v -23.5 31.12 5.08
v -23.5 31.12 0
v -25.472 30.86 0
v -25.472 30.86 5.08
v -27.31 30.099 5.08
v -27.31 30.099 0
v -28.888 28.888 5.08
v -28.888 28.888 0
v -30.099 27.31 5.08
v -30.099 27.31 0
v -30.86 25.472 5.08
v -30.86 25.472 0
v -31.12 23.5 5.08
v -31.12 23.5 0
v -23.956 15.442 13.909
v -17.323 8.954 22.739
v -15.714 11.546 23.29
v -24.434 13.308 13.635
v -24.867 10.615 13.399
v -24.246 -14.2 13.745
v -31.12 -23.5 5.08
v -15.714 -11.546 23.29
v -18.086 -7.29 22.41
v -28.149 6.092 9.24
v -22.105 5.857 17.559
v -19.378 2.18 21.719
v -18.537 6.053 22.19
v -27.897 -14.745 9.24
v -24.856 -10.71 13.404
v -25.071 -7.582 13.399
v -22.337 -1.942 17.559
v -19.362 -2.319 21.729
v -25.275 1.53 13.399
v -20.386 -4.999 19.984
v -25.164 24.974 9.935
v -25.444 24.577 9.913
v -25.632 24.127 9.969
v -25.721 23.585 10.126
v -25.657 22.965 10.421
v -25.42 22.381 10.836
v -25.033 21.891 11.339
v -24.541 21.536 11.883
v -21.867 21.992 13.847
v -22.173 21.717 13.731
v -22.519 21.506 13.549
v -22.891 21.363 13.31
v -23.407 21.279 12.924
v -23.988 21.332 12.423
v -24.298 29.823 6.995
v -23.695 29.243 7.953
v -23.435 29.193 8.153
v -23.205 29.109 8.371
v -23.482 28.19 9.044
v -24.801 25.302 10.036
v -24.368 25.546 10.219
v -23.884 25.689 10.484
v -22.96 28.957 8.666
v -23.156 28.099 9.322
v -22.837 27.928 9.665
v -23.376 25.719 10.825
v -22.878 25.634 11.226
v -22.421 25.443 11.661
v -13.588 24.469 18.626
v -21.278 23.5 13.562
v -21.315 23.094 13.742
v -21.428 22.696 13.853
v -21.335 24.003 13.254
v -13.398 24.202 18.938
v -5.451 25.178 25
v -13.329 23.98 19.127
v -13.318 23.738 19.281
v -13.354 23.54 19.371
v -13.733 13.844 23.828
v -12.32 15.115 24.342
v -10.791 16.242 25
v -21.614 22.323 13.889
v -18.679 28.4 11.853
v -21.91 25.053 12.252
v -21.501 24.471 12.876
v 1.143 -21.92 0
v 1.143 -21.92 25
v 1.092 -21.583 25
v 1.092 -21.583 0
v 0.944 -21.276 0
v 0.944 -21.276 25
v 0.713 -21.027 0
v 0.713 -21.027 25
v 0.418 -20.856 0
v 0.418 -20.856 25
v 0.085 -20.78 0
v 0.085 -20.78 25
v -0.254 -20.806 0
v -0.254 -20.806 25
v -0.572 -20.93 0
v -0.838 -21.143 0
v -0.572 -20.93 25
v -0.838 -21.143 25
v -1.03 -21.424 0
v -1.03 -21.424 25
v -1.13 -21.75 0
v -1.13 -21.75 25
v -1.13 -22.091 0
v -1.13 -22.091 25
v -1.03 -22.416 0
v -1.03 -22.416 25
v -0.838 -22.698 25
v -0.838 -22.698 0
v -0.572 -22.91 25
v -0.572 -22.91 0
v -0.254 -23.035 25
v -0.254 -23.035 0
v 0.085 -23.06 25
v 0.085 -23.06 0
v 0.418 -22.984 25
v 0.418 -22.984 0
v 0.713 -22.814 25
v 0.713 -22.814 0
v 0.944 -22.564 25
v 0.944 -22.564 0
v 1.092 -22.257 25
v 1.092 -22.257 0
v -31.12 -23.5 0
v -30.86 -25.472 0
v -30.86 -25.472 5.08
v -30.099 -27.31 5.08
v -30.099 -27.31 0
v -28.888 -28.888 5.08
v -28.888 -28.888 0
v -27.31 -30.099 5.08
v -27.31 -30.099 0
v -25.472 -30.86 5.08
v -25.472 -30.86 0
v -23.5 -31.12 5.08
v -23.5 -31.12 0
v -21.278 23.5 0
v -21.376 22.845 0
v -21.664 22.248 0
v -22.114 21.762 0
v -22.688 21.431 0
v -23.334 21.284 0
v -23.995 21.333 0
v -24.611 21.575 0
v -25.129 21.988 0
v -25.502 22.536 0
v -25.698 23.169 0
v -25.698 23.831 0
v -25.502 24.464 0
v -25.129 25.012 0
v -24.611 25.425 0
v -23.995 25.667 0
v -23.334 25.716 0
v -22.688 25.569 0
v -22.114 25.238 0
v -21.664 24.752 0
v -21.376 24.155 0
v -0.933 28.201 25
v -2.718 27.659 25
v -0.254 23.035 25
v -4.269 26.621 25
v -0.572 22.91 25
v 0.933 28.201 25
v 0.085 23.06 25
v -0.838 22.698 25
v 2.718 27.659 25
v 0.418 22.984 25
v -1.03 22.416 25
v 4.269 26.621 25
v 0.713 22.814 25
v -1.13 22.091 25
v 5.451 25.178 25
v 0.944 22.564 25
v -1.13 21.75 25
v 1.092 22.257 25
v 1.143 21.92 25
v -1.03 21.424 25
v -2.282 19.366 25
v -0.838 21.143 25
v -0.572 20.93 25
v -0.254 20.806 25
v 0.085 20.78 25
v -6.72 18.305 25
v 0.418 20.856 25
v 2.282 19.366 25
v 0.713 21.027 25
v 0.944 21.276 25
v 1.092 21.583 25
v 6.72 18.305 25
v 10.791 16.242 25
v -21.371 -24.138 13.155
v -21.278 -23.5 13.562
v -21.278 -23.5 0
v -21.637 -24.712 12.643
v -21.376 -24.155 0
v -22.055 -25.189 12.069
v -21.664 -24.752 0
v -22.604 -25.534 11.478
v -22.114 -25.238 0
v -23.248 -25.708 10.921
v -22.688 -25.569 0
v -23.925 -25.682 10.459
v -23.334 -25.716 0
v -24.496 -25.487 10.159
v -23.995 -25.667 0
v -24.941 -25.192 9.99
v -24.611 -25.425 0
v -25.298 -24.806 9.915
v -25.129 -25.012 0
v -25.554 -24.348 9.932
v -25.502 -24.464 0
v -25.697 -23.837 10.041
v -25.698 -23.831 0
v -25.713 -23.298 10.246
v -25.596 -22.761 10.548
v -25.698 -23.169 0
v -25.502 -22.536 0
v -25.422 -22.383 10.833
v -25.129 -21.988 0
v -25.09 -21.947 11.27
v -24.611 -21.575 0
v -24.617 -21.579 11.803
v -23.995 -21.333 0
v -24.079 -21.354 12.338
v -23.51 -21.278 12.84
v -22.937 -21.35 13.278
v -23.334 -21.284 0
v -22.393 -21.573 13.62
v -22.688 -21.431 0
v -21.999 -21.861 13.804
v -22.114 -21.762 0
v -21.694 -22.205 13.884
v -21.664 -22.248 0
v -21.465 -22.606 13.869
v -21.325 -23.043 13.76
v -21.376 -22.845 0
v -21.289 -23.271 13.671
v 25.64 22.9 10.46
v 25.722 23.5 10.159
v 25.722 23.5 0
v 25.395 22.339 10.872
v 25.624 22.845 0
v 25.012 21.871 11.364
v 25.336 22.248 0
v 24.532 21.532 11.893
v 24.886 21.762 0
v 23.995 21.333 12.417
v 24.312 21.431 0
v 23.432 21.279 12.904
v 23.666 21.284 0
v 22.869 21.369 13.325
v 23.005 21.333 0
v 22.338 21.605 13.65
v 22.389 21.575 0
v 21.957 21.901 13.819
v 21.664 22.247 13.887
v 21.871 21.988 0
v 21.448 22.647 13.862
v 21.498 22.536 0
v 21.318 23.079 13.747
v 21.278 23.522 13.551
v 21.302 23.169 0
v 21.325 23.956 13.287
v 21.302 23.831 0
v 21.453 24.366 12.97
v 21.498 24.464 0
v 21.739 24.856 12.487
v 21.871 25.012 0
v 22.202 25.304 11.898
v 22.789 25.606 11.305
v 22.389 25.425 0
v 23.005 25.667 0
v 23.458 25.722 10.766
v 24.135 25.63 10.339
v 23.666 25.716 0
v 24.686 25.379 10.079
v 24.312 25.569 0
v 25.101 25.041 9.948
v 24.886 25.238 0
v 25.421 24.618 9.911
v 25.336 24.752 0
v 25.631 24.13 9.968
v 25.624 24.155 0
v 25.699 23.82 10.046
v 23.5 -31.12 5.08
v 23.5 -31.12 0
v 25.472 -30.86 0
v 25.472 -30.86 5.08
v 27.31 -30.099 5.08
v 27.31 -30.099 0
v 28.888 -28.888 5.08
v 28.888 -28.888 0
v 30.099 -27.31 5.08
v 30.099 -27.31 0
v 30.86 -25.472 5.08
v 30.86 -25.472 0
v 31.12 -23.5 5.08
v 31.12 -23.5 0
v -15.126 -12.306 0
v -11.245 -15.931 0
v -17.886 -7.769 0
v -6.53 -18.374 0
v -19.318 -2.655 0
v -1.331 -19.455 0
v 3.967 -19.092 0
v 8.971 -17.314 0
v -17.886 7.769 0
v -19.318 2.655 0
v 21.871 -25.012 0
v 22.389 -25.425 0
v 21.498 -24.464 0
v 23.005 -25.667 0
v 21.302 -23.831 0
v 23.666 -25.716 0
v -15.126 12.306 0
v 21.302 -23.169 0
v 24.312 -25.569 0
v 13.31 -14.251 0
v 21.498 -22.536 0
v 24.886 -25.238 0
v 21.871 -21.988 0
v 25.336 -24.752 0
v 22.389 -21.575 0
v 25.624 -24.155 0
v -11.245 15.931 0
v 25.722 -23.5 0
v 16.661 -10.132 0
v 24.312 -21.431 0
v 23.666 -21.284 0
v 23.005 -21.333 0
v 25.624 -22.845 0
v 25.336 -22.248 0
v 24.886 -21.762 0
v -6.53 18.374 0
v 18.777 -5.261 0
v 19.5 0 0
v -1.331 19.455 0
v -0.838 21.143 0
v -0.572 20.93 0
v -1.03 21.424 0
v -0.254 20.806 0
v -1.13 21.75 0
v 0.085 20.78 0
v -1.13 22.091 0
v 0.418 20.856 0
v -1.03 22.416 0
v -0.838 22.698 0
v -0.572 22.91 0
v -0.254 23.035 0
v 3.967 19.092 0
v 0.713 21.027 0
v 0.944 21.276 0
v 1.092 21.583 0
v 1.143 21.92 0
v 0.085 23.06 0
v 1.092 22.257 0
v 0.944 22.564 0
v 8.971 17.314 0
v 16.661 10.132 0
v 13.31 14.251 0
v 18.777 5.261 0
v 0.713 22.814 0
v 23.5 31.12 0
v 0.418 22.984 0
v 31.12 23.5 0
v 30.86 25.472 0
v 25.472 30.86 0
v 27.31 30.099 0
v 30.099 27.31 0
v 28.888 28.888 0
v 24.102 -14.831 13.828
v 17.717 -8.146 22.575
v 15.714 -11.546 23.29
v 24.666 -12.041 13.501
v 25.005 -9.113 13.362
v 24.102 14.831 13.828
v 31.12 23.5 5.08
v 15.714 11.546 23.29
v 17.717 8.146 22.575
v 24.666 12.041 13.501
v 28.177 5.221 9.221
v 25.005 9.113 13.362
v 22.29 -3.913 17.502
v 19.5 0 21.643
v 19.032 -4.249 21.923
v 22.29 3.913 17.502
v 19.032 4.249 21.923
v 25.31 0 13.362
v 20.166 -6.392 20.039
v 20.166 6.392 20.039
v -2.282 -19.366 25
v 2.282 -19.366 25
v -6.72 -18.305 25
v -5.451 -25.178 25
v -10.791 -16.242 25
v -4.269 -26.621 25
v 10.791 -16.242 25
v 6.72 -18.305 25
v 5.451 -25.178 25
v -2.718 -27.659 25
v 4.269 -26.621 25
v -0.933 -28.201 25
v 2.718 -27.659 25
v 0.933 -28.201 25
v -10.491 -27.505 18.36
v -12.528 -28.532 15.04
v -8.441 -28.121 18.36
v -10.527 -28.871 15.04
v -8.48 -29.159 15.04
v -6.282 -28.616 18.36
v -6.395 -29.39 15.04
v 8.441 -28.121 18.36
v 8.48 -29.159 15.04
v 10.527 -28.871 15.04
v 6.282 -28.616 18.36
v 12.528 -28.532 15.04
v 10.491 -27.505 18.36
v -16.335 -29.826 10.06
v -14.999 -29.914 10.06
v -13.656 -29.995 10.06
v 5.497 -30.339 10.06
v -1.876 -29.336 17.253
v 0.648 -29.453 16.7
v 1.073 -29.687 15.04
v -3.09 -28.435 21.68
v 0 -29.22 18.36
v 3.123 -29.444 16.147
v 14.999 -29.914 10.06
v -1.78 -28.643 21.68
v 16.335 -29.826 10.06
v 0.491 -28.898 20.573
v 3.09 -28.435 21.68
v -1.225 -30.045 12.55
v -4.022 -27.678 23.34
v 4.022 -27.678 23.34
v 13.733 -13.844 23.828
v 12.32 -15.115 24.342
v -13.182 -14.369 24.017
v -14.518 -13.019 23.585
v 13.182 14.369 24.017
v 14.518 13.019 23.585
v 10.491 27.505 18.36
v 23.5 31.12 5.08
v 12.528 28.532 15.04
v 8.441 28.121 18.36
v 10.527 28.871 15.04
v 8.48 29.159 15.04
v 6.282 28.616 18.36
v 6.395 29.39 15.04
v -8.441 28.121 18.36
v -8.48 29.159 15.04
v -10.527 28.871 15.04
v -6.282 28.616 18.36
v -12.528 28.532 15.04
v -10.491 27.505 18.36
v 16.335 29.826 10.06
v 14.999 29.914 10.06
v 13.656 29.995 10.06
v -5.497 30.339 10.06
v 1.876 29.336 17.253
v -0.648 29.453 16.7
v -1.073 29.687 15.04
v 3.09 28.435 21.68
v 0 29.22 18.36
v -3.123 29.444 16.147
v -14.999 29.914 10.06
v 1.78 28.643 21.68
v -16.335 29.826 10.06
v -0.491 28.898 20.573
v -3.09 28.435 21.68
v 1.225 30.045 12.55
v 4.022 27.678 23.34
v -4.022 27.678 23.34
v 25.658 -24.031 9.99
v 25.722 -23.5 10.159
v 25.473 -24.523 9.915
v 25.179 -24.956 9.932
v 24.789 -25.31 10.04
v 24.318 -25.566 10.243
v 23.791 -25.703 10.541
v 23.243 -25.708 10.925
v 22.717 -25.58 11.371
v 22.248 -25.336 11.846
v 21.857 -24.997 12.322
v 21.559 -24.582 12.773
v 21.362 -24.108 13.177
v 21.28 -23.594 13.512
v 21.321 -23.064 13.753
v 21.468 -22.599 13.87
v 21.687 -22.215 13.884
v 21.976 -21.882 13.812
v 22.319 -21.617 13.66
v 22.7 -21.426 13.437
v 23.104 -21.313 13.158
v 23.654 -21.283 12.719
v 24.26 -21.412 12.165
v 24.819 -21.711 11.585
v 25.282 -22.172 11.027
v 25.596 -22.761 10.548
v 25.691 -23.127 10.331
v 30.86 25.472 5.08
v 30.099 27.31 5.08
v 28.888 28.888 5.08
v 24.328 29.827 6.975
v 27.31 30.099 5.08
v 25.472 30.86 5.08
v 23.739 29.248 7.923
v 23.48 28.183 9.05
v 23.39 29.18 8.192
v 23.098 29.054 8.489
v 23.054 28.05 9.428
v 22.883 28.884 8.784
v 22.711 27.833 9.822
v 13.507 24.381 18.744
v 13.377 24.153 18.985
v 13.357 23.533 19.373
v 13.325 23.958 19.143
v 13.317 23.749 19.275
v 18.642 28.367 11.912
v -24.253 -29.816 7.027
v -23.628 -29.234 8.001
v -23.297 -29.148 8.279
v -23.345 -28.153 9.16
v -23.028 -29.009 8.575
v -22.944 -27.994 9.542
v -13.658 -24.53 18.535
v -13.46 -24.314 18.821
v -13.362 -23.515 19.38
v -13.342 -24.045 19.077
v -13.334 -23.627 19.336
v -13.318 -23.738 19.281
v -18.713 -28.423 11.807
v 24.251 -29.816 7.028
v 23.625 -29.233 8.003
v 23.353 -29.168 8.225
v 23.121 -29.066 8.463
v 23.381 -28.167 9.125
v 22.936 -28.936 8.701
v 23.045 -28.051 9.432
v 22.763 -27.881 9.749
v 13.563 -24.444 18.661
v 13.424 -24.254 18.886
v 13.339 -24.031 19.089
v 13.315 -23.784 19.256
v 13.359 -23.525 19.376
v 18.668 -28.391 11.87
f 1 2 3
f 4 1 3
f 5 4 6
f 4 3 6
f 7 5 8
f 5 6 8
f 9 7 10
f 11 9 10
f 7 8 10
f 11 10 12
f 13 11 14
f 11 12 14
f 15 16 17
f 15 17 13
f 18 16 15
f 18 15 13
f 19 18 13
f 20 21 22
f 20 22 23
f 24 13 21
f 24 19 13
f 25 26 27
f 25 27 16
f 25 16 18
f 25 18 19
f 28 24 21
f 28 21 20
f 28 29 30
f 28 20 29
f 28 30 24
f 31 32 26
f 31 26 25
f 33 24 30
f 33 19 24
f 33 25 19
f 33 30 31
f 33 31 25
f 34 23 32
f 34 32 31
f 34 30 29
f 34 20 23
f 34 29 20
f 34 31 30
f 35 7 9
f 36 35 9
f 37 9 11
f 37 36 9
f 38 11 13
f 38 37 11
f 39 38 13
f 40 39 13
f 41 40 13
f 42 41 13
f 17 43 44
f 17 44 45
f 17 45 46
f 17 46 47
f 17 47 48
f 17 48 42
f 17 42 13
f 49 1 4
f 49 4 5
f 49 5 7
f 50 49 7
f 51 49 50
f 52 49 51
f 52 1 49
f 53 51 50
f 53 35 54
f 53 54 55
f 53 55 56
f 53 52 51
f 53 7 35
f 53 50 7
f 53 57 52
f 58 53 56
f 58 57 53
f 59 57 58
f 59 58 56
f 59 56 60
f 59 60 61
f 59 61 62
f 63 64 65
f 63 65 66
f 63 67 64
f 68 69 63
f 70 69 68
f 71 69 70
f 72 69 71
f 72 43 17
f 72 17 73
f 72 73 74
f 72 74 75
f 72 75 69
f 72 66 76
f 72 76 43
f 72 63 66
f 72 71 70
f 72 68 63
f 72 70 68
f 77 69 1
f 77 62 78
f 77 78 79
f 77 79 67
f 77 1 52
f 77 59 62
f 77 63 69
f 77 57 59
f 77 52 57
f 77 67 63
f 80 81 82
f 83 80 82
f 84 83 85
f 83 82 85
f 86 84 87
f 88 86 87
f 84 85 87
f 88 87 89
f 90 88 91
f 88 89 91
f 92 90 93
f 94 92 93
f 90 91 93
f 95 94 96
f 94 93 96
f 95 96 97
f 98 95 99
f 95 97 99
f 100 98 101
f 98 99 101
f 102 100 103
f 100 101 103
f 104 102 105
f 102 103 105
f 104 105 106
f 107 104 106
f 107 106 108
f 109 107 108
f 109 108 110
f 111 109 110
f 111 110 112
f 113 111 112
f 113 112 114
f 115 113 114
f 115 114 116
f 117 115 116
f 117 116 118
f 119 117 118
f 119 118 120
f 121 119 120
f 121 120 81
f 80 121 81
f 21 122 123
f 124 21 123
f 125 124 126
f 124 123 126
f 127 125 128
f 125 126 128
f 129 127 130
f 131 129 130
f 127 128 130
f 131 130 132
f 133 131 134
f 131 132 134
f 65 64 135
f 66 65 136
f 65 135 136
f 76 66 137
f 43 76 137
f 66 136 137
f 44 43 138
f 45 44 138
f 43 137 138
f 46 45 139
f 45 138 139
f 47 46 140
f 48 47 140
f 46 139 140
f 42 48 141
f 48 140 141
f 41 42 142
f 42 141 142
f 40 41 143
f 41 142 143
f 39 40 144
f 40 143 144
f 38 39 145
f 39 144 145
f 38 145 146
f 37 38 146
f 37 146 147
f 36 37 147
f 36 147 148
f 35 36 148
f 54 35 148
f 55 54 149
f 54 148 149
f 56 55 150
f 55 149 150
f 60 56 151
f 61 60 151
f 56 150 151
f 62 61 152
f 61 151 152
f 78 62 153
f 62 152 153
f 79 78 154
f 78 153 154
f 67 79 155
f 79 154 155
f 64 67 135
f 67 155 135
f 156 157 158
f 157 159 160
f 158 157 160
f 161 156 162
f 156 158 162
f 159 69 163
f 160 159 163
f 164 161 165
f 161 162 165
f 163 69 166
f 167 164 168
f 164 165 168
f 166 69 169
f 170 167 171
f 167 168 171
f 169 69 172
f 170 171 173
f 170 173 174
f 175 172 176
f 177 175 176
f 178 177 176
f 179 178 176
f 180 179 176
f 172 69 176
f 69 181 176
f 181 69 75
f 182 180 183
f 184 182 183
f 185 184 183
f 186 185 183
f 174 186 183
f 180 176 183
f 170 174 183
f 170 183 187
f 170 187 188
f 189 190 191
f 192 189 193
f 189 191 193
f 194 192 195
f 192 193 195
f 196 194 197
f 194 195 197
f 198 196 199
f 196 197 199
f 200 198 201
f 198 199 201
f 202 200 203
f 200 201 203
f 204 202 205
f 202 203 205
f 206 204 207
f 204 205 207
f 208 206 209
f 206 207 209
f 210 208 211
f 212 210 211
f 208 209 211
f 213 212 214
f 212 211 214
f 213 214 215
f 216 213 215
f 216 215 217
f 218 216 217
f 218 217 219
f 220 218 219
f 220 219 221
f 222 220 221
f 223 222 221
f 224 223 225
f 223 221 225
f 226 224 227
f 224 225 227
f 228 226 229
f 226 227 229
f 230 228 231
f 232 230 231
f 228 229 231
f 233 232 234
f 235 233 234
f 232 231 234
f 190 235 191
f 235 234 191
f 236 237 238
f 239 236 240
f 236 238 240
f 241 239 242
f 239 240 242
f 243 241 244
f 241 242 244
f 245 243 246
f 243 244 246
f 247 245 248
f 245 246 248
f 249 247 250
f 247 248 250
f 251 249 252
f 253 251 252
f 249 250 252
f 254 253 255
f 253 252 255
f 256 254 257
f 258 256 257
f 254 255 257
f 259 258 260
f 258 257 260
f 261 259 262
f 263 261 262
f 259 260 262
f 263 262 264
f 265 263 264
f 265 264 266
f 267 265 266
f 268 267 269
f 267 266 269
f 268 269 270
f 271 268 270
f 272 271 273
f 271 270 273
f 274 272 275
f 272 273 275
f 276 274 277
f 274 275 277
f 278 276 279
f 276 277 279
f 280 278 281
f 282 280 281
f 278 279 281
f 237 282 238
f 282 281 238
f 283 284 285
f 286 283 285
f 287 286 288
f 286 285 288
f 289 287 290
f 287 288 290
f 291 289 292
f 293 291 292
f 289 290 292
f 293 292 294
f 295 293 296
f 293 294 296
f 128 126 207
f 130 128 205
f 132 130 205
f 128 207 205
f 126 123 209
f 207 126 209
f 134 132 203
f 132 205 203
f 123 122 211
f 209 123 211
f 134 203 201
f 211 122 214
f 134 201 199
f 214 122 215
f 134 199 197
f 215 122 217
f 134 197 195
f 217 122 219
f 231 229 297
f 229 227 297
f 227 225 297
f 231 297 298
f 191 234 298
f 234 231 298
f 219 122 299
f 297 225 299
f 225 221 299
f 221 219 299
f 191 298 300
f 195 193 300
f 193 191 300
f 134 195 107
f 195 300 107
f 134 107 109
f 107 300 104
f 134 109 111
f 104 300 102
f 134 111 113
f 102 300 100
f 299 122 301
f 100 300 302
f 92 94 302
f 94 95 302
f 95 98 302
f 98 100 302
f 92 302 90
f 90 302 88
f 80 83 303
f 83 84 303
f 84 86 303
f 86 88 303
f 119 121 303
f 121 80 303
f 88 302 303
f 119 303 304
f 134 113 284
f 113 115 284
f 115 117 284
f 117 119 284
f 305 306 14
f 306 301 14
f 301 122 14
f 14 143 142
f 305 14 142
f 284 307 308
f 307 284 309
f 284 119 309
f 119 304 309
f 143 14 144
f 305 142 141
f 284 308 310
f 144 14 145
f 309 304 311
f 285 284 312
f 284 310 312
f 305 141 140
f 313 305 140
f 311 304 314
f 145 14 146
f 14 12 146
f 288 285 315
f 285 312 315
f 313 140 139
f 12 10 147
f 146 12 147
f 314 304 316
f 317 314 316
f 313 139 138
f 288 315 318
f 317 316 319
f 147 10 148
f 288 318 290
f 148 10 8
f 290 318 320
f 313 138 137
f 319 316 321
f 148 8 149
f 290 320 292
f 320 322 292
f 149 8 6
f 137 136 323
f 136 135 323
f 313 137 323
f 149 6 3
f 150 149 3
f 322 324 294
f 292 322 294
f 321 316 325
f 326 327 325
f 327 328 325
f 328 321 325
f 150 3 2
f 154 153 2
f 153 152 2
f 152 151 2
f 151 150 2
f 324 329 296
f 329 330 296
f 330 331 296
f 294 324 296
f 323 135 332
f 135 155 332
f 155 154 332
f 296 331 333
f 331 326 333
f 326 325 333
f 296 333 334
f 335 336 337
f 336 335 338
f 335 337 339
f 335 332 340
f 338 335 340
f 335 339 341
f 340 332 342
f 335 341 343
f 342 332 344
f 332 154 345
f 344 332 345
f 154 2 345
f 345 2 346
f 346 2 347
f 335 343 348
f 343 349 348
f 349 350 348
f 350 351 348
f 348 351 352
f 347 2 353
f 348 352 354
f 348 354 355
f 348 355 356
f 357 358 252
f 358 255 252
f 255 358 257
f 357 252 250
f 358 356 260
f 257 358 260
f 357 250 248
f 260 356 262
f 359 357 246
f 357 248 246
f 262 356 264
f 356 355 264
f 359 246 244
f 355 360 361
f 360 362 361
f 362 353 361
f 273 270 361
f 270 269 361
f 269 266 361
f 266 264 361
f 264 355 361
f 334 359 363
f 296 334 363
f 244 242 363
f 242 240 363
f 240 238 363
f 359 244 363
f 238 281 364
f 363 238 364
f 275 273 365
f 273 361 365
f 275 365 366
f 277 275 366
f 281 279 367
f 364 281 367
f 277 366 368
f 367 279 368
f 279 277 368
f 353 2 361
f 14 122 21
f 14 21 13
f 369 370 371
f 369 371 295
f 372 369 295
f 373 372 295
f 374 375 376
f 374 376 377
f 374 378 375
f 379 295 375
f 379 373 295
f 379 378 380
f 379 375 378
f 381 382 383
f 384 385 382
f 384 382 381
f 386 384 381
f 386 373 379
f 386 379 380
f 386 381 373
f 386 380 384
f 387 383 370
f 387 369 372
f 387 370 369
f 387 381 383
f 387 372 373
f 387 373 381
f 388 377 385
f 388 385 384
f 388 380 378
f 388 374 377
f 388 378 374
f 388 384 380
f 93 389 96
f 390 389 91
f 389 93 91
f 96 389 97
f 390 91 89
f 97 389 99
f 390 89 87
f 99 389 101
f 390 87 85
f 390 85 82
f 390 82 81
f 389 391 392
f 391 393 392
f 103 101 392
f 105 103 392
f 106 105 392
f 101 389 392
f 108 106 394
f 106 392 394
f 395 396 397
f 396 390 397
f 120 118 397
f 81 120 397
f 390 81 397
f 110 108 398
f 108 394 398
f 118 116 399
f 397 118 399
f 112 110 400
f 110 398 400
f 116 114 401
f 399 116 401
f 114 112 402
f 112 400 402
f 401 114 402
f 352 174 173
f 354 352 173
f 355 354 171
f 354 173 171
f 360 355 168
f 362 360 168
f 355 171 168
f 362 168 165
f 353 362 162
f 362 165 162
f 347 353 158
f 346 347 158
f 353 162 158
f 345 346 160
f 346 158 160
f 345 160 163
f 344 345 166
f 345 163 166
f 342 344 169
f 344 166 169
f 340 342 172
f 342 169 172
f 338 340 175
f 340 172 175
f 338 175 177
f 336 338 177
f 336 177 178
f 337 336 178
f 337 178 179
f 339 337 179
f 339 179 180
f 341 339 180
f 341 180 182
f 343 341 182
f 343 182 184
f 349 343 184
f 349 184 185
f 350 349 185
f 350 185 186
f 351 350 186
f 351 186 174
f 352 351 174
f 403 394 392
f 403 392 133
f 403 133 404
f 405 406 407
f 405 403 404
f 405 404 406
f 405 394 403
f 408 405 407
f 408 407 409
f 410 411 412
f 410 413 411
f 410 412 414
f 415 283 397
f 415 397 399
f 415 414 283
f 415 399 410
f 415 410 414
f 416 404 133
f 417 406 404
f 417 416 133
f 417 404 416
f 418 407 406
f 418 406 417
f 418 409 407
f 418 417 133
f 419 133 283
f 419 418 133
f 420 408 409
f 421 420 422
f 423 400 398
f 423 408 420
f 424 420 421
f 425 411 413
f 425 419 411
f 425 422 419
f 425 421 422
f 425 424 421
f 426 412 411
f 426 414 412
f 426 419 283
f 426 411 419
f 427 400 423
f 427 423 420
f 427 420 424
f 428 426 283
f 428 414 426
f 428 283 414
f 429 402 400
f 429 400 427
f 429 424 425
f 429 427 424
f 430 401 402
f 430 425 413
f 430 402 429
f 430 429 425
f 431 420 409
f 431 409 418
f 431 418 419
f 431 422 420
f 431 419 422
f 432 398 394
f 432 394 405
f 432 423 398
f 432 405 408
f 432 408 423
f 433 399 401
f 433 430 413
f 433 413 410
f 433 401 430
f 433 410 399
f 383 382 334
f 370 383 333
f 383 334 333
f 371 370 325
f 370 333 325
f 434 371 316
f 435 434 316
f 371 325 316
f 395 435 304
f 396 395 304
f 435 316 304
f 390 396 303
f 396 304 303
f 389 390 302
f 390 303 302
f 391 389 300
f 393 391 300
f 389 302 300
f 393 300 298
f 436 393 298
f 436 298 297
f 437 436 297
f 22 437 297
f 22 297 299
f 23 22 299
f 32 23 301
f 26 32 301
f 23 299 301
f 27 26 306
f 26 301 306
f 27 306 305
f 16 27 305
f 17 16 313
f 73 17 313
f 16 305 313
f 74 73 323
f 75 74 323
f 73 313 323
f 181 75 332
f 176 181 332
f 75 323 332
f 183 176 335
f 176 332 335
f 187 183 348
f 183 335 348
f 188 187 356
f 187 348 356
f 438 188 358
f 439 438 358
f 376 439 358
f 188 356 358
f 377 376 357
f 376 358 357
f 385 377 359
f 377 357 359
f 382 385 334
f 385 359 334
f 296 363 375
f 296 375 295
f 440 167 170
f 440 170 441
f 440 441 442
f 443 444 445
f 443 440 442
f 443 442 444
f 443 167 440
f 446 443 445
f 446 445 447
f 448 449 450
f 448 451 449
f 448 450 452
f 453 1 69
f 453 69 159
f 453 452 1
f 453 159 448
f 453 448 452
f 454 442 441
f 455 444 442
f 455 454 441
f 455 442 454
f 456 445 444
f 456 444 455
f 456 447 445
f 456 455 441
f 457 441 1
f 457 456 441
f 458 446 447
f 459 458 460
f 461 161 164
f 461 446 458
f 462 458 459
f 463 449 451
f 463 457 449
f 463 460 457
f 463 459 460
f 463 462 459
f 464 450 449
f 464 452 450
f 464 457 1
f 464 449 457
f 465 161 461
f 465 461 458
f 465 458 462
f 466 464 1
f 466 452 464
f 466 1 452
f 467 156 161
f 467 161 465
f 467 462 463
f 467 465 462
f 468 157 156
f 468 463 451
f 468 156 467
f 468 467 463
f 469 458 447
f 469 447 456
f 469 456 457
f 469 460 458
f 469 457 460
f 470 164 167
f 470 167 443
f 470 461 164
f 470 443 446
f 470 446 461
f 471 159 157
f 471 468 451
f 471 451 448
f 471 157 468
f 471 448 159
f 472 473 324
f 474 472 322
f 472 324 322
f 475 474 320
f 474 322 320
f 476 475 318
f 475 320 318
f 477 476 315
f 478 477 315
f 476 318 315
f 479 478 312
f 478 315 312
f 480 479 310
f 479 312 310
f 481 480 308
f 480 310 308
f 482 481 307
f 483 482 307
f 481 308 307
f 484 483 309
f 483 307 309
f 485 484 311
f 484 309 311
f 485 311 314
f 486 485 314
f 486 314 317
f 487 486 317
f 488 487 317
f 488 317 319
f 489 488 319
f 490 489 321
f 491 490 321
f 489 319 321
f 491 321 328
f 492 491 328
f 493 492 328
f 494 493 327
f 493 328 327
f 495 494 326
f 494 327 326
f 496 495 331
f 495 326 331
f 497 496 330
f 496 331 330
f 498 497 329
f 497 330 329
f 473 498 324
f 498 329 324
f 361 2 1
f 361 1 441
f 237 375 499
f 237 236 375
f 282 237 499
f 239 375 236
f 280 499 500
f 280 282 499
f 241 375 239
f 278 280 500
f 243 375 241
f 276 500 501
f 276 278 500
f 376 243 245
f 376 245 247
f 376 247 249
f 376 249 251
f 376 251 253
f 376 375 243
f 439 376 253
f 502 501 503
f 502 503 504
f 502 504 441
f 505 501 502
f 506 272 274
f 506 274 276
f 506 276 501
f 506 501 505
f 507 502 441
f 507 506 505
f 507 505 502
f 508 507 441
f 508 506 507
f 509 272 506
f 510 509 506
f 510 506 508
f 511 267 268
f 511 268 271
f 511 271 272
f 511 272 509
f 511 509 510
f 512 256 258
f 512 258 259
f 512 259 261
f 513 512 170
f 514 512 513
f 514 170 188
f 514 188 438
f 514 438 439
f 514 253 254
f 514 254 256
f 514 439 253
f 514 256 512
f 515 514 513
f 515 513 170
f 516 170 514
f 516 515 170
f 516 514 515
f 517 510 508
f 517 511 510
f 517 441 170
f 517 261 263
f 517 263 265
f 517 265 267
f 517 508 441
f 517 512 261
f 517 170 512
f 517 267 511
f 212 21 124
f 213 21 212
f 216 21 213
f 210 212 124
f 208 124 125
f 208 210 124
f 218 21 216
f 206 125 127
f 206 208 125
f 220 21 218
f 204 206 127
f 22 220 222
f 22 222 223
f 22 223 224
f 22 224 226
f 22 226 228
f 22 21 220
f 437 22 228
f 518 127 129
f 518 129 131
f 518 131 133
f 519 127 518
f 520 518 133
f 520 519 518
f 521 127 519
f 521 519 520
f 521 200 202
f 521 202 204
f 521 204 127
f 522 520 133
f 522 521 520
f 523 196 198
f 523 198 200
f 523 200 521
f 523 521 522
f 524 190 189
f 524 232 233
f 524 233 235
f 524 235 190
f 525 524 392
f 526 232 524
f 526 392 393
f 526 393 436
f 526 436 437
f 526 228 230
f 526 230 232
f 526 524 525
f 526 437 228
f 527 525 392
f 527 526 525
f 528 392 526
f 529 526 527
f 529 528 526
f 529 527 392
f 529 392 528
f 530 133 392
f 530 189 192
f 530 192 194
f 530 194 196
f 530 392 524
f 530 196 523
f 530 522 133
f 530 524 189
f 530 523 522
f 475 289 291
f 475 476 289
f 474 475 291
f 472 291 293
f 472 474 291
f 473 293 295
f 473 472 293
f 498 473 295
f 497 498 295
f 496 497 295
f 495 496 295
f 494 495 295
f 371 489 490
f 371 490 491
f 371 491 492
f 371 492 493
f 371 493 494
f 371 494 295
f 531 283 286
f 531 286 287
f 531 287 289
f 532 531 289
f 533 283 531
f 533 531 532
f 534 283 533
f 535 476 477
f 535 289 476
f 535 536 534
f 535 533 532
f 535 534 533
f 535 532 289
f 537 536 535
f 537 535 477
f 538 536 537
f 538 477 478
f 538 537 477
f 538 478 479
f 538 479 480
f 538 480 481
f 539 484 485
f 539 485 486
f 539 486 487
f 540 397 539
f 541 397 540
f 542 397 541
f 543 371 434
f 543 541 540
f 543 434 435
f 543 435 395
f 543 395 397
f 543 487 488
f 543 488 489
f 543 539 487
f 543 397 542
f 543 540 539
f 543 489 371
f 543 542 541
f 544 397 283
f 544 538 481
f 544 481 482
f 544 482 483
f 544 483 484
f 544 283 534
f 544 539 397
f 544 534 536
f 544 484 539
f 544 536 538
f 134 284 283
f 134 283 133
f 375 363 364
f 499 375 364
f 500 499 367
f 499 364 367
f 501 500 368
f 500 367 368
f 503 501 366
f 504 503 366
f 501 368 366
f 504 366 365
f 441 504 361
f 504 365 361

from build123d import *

# Parameters (mm, degrees)
SKETCH_R        = 19.5
SKETCH_R_2      = 2.2225
PAD_DEPTH       = 5.08
SKETCH030_R     = 2.2225
SKETCH030_R_2   = 19.5
POCKET_DEPTH    = 19.921
SKETCH031_R     = 1.143
POCKET001_DEPTH = 25.001


with BuildPart() as part:
    # Sketch → Pad (new body)
    with BuildSketch(Plane.XY):
        with BuildLine():
            ThreePointArc((-31.12, -23.5), (-28.888154, -28.888154), (-23.5, -31.12))
            Line((23.5, -31.12), (-23.5, -31.12))
            ThreePointArc((23.5, -31.12), (28.888154, -28.888154), (31.12, -23.5))
            Line((31.12, 23.5), (31.12, -23.5))
            ThreePointArc((31.12, 23.5), (28.888154, 28.888154), (23.5, 31.12))
            Line((-23.5, 31.12), (23.5, 31.12))
            ThreePointArc((-23.5, 31.12), (-28.888154, 28.888154), (-31.12, 23.5))
            Line((-31.12, -23.5), (-31.12, 23.5))
        make_face()
        Circle(SKETCH_R, mode=Mode.SUBTRACT)
        with Locations((-23.5, 23.5)):
            Circle(SKETCH_R_2, mode=Mode.SUBTRACT)
        with Locations((23.5, 23.5)):
            Circle(SKETCH_R_2, mode=Mode.SUBTRACT)
        with Locations((23.5, -23.5)):
            Circle(SKETCH_R_2, mode=Mode.SUBTRACT)
        with Locations((-23.5, -23.5)):
            Circle(SKETCH_R_2, mode=Mode.SUBTRACT)
    extrude(amount=PAD_DEPTH)

    # Sketch029 (on Face15 of Pad) → AdditiveLoft section 0
    with BuildSketch(Plane.XY.offset(5.08)):
        with BuildLine():
            ThreePointArc((-31.12, -23.5), (-28.888154, -28.888154), (-23.5, -31.12))
            Line((23.5, -31.12), (-23.5, -31.12))
            ThreePointArc((23.5, -31.12), (28.888154, -28.888154), (31.12, -23.5))
            Line((31.12, 23.5), (31.12, -23.5))
            ThreePointArc((31.12, 23.5), (28.888154, 28.888154), (23.5, 31.12))
            Line((-23.5, 31.12), (23.5, 31.12))
            ThreePointArc((-23.5, 31.12), (-28.888154, 28.888154), (-31.12, 23.5))
            Line((-31.12, -23.5), (-31.12, 23.5))
        make_face()
    # Sketch028 (on DatumPlane) → AdditiveLoft section 1
    with BuildSketch(Plane(origin=(0, 0, 25), x_dir=(1, 0, 0), z_dir=(0, 0, -1))):
        with BuildLine():
            ThreePointArc((-14.267762, 10.42365), (-17.145, 0), (-14.267762, -10.42365))
            Line((-14.267762, -10.42365), (-5.450863, -25.177701))
            ThreePointArc((-5.450863, -25.177701), (0, -28.27031), (5.450863, -25.177701))
            Line((5.450863, -25.177701), (14.267762, -10.42365))
            ThreePointArc((14.267762, -10.42365), (17.145, 0), (14.267762, 10.42365))
            Line((14.267762, 10.42365), (5.450863, 25.177701))
            ThreePointArc((5.450863, 25.177701), (0, 28.27031), (-5.450863, 25.177701))
            Line((-5.450863, 25.177701), (-14.267762, 10.42365))
        make_face()
    loft()

    # Sketch030 (on Face24 of AdditiveLoft) → Pocket (cut, through all)
    with BuildSketch(Plane(origin=(0, 0, 5.08), x_dir=(1, 0, 0), z_dir=(0, 0, -1))):
        with Locations((23.5, 23.5)):
            Circle(SKETCH030_R)
        Circle(SKETCH030_R_2)
        with Locations((-23.5, 23.5)):
            Circle(SKETCH030_R)
        with Locations((-23.5, -23.5)):
            Circle(SKETCH030_R)
        with Locations((23.5, -23.5)):
            Circle(SKETCH030_R)
    extrude(amount=-POCKET_DEPTH, mode=Mode.SUBTRACT)

    # Sketch031 (on Face19 of Pocket) → Pocket001 (cut, through all)
    with BuildSketch(Plane.XY.offset(25)):
        with Locations((0, 21.9202)):
            Circle(SKETCH031_R)
        with Locations((0, -21.9202)):
            Circle(SKETCH031_R)
    extrude(amount=-POCKET001_DEPTH, mode=Mode.SUBTRACT)


solid = part.part
